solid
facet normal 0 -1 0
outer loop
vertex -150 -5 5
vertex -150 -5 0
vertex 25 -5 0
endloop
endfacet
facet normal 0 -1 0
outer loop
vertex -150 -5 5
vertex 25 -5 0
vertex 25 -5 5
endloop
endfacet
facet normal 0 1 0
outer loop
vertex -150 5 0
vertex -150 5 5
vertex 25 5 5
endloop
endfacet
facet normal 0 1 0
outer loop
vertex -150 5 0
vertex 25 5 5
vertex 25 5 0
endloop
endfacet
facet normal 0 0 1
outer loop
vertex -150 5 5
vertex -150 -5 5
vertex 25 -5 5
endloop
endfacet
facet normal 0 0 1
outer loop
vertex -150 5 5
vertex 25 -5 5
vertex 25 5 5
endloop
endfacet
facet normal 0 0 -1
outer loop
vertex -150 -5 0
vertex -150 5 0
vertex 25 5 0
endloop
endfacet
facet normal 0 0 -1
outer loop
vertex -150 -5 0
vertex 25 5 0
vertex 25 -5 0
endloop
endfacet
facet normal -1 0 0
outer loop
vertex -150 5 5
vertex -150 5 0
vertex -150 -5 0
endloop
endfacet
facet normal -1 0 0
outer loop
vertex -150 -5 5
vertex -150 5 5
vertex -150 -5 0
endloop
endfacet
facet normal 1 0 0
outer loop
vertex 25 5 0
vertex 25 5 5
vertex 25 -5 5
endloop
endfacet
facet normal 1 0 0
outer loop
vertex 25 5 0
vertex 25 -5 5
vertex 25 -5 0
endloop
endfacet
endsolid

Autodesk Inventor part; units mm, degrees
ref_plane "YZ Plane" through (0, 0, 0) normal (1, 0, 0) x (0, 1, 0)
ref_plane "XZ Plane" through (0, 0, 0) normal (0, 1, 0) x (-1, 0, 0)
ref_plane "XY Plane" through (0, 0, 0) normal (0, 0, 1) x (1, 0, 0)
sketch "Sketch1" plane through (0, 0, 0) normal (0, 0, 1) x (1, 0, 0)
  line L0 (150, 5) -> (-150, 5)
  line L1 (-150, 5) -> (-150, -5)
  line L2 (-150, -5) -> (150, -5)
  line L3 (150, -5) -> (150, 5)
  point P0 (0, 0)
extrude "Extrusion1" add sketch "Sketch1" along normal blind 5
sketch "Sketch2" plane through (150, -5, 0) normal (1, 0, 0) x (0, 0, -1)
  line L0 (0, 0) -> (0, 10) projected
  line L1 (0, 10) -> (-5, 10) projected
  line L2 (-5, 0) -> (-5, 10) projected
  line L3 (0, 0) -> (-5, 0) projected
  point P0 (0, 5)
extrude "Extrusion2" cut sketch "Sketch2" against normal blind 150
sketch "Sketch3" plane through (0, -5, 0) normal (1, 0, 0) x (0, 0, -1)
  line L0 (0, 10) -> (0, 0) projected
  line L1 (-5, 10) -> (0, 10) projected
  line L2 (-5, 0) -> (-5, 10) projected
  line L3 (0, 0) -> (-5, 0) projected
  point P0 (0, 5)
extrude "Extrusion3" add sketch "Sketch3" along normal blind 50
sketch "Sketch4" plane through (50, -5, 0) normal (1, 0, 0) x (0, 0, -1)
  line L0 (-5, 10) -> (-5, 0) projected
  line L1 (-5, 0) -> (0, 0) projected
  line L2 (0, 0) -> (0, 10) projected
  line L3 (0, 10) -> (-5, 10) projected
  point P0 (0, 5)
extrude "Extrusion4" cut sketch "Sketch4" against normal blind 25
properties part number "tail vertical rod"
